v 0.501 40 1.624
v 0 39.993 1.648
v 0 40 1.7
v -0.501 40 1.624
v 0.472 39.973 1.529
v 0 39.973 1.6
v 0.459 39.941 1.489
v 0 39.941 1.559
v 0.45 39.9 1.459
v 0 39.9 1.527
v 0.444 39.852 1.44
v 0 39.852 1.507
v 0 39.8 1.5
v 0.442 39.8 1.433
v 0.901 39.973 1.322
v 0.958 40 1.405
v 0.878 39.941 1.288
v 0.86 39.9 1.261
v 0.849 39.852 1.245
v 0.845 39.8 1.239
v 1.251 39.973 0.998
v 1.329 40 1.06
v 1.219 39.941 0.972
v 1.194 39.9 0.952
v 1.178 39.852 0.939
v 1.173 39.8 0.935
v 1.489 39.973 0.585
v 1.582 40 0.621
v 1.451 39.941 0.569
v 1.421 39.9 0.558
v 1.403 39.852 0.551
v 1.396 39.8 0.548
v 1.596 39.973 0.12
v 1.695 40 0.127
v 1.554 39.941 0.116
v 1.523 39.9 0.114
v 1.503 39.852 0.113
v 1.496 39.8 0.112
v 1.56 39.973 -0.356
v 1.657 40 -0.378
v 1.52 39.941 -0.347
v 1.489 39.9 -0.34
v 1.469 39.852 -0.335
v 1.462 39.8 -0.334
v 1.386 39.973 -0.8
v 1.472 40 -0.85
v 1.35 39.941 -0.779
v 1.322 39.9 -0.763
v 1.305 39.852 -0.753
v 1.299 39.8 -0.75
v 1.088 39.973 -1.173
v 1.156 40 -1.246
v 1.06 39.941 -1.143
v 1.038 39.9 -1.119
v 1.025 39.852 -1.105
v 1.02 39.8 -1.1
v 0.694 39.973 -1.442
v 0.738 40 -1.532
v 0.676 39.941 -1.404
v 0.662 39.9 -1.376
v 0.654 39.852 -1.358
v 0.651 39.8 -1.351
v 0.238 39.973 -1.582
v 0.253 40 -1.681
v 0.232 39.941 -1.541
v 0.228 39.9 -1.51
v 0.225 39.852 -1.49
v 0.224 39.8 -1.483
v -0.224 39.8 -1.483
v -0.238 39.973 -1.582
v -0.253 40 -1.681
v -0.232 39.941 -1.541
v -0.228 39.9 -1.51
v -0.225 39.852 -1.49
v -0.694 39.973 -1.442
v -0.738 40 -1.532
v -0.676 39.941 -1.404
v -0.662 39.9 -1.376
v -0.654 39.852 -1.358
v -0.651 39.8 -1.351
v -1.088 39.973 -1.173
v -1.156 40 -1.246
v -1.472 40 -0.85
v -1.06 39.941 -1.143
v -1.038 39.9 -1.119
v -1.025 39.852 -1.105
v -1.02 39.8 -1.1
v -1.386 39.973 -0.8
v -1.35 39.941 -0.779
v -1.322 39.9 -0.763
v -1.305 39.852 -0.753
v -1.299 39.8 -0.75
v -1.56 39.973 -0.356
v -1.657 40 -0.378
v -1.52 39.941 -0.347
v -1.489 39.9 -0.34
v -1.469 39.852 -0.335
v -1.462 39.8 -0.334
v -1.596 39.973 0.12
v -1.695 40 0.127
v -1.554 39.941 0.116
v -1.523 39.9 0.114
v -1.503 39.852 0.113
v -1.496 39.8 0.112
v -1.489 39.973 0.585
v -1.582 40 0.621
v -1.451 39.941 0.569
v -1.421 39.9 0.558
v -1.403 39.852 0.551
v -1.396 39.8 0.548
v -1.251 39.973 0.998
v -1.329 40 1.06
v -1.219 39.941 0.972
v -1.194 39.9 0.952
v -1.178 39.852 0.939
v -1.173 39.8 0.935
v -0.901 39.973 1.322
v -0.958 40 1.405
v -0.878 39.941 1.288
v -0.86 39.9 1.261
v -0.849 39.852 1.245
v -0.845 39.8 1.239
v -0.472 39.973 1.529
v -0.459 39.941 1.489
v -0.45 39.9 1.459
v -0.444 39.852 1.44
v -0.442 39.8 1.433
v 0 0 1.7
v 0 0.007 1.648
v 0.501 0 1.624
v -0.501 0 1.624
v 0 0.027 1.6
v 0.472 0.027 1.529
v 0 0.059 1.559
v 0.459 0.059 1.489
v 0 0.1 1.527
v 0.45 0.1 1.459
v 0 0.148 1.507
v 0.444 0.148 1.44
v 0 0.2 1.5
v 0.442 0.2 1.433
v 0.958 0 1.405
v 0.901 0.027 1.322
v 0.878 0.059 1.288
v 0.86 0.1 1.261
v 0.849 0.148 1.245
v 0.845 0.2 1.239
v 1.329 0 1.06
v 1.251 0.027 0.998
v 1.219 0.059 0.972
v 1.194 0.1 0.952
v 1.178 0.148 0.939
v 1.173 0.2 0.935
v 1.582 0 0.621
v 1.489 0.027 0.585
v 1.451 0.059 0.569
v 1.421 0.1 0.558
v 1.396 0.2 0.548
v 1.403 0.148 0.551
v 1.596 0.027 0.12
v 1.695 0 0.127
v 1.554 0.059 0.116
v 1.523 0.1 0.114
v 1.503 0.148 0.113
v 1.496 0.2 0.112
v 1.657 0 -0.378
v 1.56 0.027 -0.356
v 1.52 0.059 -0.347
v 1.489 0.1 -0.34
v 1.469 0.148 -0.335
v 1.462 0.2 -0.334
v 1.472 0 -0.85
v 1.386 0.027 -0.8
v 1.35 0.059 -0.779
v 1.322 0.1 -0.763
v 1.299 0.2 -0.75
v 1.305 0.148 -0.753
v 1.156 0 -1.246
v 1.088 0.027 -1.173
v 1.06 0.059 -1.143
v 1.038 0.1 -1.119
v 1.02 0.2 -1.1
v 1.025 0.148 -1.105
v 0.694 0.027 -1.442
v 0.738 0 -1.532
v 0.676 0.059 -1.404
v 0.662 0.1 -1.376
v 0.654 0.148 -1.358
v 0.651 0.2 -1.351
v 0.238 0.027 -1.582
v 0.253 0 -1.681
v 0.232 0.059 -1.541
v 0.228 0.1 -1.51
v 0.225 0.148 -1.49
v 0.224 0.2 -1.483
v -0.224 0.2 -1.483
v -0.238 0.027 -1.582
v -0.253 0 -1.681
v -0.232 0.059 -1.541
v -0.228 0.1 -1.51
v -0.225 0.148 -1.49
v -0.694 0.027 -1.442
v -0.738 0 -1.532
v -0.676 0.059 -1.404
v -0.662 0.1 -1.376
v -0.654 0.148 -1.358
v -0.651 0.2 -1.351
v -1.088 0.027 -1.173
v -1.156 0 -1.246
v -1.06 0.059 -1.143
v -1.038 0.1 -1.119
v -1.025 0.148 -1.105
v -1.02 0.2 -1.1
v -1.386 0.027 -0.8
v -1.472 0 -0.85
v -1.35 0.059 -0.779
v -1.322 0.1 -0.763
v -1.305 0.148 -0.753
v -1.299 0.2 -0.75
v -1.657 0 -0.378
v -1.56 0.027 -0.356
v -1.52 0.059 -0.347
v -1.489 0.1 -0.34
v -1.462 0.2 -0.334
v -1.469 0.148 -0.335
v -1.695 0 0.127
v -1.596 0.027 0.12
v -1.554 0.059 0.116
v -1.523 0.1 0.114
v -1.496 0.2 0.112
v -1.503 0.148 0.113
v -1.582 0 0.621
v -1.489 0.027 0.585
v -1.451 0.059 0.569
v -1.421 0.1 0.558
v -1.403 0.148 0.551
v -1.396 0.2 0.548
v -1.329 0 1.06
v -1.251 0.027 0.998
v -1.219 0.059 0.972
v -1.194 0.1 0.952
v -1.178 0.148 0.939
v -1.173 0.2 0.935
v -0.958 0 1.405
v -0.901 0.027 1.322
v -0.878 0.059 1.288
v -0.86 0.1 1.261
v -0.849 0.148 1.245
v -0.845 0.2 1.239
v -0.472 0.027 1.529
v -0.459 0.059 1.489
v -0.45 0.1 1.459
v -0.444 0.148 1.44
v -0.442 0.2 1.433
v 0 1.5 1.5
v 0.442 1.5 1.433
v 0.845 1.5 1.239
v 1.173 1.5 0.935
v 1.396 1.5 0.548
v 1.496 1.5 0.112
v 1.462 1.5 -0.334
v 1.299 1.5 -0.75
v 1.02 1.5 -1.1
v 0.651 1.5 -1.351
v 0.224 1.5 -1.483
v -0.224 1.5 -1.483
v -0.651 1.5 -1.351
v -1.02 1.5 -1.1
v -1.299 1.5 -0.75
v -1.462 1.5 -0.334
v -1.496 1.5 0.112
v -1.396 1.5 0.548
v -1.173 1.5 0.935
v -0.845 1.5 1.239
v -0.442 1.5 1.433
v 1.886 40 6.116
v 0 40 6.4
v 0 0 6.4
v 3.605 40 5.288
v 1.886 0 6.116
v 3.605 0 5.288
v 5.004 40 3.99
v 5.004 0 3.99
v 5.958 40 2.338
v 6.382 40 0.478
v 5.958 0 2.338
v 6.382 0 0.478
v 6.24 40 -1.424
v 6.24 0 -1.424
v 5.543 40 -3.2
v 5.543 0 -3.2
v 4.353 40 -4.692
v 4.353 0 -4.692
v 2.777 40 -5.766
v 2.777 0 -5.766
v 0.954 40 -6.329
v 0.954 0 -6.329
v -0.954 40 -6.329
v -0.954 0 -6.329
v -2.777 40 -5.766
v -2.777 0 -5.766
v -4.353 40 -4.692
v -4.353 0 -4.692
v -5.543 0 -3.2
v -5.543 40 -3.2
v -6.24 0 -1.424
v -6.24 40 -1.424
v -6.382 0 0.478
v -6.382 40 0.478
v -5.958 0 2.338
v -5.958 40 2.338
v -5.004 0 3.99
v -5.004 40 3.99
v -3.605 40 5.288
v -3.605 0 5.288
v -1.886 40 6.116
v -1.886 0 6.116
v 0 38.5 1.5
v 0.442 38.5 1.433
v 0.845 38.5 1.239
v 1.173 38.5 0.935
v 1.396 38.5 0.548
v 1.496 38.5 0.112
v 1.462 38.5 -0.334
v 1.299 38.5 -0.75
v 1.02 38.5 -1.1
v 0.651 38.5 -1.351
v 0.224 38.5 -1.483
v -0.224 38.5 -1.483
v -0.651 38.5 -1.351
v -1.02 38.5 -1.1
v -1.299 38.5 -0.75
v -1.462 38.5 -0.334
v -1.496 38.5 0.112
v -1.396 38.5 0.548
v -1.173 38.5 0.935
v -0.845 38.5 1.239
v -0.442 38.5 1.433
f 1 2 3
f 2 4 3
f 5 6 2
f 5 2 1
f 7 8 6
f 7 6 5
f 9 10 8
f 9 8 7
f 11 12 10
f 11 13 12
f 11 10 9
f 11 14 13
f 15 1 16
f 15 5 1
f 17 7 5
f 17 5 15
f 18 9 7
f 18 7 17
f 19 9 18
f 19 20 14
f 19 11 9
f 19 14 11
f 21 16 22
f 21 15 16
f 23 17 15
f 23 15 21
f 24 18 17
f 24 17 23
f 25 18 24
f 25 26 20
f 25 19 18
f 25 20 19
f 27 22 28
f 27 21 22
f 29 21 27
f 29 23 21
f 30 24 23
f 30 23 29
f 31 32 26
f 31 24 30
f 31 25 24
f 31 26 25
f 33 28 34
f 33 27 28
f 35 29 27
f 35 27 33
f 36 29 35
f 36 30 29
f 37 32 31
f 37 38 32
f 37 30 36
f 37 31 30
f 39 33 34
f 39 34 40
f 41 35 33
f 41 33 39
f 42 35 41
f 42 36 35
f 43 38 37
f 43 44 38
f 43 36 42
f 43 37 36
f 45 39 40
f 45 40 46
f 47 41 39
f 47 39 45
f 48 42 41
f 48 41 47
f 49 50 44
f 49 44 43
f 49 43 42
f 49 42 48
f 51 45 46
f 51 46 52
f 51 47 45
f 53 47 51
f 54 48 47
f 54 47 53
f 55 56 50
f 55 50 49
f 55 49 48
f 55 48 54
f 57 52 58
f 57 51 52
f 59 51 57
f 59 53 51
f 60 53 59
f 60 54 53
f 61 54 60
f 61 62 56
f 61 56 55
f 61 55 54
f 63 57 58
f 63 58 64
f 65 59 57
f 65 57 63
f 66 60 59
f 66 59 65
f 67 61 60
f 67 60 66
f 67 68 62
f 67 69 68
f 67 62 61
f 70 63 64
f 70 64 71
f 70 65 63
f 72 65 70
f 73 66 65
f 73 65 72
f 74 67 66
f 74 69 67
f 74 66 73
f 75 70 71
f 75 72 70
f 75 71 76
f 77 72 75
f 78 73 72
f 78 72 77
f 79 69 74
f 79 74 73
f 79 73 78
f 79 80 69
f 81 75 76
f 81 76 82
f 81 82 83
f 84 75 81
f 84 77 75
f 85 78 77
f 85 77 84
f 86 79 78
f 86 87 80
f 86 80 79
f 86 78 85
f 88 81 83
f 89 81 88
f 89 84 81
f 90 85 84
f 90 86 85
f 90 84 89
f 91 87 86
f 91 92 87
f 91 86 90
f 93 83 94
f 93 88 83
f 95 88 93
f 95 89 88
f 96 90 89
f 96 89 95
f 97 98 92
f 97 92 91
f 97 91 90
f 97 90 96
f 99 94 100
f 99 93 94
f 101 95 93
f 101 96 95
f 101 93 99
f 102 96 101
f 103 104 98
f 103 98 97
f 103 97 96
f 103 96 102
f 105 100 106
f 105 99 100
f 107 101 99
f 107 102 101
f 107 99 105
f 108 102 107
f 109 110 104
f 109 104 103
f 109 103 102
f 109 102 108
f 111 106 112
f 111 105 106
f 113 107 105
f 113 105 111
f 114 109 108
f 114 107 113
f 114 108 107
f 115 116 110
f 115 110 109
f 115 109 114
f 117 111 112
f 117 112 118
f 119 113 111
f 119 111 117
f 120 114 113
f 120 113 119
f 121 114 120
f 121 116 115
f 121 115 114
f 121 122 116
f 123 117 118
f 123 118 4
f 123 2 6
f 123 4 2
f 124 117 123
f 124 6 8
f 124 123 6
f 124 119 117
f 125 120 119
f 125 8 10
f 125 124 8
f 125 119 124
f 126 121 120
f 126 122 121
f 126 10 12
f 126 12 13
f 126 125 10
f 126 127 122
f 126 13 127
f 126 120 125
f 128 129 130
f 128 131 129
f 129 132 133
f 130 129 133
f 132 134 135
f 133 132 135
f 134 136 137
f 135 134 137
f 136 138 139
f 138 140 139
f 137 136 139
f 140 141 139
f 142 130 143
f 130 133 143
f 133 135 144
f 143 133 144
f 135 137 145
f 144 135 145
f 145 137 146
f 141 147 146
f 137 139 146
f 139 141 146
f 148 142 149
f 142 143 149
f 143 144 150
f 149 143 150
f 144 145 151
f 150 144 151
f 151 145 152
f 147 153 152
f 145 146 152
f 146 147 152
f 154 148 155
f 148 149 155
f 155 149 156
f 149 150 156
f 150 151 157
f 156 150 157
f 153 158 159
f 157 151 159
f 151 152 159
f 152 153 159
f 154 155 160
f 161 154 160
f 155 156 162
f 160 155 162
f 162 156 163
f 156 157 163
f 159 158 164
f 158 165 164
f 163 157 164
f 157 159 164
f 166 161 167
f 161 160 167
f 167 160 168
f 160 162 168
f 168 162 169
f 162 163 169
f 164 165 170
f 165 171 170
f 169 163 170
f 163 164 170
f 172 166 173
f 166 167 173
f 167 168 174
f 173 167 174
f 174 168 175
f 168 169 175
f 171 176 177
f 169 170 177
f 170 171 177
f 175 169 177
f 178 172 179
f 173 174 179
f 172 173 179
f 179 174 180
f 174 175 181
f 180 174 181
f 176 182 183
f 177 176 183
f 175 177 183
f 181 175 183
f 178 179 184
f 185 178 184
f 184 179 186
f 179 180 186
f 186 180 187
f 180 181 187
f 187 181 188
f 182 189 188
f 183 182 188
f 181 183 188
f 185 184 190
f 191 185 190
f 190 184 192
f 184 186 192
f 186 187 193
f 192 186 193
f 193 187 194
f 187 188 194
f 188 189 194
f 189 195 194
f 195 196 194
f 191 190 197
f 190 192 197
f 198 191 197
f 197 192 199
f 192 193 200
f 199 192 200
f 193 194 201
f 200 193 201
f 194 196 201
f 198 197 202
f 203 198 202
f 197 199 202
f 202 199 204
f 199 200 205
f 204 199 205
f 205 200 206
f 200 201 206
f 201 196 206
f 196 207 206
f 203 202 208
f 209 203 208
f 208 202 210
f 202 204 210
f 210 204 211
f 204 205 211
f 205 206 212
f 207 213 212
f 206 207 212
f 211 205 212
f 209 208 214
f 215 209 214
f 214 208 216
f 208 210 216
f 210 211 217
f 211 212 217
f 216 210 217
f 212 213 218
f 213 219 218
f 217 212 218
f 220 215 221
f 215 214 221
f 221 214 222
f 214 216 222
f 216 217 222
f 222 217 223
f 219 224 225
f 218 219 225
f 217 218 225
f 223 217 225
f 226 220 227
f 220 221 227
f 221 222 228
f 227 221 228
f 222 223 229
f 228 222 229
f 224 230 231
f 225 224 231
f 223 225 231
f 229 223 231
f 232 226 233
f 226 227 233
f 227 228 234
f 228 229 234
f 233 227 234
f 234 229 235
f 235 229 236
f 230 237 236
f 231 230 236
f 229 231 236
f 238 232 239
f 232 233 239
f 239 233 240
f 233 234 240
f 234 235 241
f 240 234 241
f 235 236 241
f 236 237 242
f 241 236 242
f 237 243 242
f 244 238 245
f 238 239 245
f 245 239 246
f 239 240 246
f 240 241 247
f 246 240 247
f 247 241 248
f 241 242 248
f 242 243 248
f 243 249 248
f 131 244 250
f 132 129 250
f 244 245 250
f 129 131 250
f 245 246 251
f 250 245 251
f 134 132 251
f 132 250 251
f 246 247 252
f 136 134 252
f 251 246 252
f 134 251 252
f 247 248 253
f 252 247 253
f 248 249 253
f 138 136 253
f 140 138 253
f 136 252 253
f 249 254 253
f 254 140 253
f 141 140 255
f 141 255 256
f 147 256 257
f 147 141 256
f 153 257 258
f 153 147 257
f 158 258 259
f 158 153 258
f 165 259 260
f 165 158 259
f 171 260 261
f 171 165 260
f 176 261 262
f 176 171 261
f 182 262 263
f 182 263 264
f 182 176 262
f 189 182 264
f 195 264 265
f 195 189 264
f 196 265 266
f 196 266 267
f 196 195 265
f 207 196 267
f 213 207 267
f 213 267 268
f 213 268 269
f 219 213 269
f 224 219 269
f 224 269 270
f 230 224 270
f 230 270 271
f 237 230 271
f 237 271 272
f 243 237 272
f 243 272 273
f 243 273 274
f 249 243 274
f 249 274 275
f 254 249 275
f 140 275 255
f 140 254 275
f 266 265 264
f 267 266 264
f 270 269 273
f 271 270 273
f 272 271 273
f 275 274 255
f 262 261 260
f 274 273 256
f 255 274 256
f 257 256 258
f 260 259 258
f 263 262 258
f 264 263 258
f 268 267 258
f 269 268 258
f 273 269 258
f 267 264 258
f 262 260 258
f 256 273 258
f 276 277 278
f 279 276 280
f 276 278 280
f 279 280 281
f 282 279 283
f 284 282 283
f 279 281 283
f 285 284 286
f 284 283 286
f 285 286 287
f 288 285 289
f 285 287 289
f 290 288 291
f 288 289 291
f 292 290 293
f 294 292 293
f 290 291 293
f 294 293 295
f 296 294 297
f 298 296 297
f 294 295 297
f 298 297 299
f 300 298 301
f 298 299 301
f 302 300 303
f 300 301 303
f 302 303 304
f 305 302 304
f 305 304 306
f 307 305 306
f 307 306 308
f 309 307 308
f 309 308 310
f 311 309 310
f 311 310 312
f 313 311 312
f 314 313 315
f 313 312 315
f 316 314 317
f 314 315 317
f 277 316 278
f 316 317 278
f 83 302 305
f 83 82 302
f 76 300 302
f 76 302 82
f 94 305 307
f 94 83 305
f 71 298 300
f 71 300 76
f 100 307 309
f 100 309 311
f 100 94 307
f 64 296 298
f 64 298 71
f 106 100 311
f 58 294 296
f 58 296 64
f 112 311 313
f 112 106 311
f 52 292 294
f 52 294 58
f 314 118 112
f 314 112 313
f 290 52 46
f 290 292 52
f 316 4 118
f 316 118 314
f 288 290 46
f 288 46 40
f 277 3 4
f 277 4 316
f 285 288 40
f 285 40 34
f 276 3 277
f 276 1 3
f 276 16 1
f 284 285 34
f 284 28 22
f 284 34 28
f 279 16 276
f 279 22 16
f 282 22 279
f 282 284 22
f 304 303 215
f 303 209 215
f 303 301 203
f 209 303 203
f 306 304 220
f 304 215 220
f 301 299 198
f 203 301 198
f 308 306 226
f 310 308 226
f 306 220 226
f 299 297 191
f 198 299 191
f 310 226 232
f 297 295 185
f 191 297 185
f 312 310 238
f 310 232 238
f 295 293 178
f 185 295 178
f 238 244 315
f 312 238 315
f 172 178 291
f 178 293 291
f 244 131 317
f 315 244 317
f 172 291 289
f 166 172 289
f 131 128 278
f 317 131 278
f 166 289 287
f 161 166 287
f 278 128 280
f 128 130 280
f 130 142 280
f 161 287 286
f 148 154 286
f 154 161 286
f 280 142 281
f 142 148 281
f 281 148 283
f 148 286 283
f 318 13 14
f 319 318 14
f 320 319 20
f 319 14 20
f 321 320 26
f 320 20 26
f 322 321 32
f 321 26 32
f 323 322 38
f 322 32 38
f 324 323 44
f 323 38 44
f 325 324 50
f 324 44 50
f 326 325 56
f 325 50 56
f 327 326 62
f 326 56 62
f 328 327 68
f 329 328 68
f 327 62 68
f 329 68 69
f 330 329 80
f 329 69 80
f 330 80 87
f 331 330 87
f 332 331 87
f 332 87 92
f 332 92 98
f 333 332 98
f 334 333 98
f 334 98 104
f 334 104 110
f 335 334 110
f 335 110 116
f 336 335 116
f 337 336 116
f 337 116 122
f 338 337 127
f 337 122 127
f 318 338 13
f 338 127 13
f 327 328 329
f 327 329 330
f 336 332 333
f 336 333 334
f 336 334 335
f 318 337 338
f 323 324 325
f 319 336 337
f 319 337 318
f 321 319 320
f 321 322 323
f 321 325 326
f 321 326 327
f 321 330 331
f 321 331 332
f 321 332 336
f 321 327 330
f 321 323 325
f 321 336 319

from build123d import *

# Parameters (mm, degrees)
SKETCH1_R           = 6.4
BOSS_EXTRUDE1_DEPTH = 40
SKETCH2_R           = 1.5
CUT_EXTRUDE1_DEPTH  = 1.5
FILLET2_R           = 0.2


with BuildPart() as part:
    # Sketch1 → Boss-Extrude1 (new body)
    with BuildSketch(Plane(origin=(0, 0, 0), x_dir=(1, 0, 0), z_dir=(0, 1, 0))):
        with Locations(Location((0, 0, 0), (0, 0, 270))):
            Circle(SKETCH1_R)
    extrude(amount=BOSS_EXTRUDE1_DEPTH)

    # Sketch2 → Cut-Extrude1 (cut)
    with BuildSketch(Plane(origin=(0, 40, 0), x_dir=(1, 0, 0), z_dir=(0, 1, 0))):
        with Locations(Location((0, 0, 0), (0, 0, 270))):
            Circle(SKETCH2_R)
    cut_extrude1 = extrude(amount=-CUT_EXTRUDE1_DEPTH, mode=Mode.SUBTRACT)

    # Mirror1: Cut-Extrude1 across plane
    add(cut_extrude1.mirror(Plane.ZX.offset(20)), mode=Mode.SUBTRACT)

    # Fillet2
    fillet2_edges = [part.edges().sort_by_distance(p)[0] for p in [
        (0, 0, -1.5),
        (0, 40, -1.5),
    ]]
    fillet(fillet2_edges, radius=FILLET2_R)


solid = part.part
